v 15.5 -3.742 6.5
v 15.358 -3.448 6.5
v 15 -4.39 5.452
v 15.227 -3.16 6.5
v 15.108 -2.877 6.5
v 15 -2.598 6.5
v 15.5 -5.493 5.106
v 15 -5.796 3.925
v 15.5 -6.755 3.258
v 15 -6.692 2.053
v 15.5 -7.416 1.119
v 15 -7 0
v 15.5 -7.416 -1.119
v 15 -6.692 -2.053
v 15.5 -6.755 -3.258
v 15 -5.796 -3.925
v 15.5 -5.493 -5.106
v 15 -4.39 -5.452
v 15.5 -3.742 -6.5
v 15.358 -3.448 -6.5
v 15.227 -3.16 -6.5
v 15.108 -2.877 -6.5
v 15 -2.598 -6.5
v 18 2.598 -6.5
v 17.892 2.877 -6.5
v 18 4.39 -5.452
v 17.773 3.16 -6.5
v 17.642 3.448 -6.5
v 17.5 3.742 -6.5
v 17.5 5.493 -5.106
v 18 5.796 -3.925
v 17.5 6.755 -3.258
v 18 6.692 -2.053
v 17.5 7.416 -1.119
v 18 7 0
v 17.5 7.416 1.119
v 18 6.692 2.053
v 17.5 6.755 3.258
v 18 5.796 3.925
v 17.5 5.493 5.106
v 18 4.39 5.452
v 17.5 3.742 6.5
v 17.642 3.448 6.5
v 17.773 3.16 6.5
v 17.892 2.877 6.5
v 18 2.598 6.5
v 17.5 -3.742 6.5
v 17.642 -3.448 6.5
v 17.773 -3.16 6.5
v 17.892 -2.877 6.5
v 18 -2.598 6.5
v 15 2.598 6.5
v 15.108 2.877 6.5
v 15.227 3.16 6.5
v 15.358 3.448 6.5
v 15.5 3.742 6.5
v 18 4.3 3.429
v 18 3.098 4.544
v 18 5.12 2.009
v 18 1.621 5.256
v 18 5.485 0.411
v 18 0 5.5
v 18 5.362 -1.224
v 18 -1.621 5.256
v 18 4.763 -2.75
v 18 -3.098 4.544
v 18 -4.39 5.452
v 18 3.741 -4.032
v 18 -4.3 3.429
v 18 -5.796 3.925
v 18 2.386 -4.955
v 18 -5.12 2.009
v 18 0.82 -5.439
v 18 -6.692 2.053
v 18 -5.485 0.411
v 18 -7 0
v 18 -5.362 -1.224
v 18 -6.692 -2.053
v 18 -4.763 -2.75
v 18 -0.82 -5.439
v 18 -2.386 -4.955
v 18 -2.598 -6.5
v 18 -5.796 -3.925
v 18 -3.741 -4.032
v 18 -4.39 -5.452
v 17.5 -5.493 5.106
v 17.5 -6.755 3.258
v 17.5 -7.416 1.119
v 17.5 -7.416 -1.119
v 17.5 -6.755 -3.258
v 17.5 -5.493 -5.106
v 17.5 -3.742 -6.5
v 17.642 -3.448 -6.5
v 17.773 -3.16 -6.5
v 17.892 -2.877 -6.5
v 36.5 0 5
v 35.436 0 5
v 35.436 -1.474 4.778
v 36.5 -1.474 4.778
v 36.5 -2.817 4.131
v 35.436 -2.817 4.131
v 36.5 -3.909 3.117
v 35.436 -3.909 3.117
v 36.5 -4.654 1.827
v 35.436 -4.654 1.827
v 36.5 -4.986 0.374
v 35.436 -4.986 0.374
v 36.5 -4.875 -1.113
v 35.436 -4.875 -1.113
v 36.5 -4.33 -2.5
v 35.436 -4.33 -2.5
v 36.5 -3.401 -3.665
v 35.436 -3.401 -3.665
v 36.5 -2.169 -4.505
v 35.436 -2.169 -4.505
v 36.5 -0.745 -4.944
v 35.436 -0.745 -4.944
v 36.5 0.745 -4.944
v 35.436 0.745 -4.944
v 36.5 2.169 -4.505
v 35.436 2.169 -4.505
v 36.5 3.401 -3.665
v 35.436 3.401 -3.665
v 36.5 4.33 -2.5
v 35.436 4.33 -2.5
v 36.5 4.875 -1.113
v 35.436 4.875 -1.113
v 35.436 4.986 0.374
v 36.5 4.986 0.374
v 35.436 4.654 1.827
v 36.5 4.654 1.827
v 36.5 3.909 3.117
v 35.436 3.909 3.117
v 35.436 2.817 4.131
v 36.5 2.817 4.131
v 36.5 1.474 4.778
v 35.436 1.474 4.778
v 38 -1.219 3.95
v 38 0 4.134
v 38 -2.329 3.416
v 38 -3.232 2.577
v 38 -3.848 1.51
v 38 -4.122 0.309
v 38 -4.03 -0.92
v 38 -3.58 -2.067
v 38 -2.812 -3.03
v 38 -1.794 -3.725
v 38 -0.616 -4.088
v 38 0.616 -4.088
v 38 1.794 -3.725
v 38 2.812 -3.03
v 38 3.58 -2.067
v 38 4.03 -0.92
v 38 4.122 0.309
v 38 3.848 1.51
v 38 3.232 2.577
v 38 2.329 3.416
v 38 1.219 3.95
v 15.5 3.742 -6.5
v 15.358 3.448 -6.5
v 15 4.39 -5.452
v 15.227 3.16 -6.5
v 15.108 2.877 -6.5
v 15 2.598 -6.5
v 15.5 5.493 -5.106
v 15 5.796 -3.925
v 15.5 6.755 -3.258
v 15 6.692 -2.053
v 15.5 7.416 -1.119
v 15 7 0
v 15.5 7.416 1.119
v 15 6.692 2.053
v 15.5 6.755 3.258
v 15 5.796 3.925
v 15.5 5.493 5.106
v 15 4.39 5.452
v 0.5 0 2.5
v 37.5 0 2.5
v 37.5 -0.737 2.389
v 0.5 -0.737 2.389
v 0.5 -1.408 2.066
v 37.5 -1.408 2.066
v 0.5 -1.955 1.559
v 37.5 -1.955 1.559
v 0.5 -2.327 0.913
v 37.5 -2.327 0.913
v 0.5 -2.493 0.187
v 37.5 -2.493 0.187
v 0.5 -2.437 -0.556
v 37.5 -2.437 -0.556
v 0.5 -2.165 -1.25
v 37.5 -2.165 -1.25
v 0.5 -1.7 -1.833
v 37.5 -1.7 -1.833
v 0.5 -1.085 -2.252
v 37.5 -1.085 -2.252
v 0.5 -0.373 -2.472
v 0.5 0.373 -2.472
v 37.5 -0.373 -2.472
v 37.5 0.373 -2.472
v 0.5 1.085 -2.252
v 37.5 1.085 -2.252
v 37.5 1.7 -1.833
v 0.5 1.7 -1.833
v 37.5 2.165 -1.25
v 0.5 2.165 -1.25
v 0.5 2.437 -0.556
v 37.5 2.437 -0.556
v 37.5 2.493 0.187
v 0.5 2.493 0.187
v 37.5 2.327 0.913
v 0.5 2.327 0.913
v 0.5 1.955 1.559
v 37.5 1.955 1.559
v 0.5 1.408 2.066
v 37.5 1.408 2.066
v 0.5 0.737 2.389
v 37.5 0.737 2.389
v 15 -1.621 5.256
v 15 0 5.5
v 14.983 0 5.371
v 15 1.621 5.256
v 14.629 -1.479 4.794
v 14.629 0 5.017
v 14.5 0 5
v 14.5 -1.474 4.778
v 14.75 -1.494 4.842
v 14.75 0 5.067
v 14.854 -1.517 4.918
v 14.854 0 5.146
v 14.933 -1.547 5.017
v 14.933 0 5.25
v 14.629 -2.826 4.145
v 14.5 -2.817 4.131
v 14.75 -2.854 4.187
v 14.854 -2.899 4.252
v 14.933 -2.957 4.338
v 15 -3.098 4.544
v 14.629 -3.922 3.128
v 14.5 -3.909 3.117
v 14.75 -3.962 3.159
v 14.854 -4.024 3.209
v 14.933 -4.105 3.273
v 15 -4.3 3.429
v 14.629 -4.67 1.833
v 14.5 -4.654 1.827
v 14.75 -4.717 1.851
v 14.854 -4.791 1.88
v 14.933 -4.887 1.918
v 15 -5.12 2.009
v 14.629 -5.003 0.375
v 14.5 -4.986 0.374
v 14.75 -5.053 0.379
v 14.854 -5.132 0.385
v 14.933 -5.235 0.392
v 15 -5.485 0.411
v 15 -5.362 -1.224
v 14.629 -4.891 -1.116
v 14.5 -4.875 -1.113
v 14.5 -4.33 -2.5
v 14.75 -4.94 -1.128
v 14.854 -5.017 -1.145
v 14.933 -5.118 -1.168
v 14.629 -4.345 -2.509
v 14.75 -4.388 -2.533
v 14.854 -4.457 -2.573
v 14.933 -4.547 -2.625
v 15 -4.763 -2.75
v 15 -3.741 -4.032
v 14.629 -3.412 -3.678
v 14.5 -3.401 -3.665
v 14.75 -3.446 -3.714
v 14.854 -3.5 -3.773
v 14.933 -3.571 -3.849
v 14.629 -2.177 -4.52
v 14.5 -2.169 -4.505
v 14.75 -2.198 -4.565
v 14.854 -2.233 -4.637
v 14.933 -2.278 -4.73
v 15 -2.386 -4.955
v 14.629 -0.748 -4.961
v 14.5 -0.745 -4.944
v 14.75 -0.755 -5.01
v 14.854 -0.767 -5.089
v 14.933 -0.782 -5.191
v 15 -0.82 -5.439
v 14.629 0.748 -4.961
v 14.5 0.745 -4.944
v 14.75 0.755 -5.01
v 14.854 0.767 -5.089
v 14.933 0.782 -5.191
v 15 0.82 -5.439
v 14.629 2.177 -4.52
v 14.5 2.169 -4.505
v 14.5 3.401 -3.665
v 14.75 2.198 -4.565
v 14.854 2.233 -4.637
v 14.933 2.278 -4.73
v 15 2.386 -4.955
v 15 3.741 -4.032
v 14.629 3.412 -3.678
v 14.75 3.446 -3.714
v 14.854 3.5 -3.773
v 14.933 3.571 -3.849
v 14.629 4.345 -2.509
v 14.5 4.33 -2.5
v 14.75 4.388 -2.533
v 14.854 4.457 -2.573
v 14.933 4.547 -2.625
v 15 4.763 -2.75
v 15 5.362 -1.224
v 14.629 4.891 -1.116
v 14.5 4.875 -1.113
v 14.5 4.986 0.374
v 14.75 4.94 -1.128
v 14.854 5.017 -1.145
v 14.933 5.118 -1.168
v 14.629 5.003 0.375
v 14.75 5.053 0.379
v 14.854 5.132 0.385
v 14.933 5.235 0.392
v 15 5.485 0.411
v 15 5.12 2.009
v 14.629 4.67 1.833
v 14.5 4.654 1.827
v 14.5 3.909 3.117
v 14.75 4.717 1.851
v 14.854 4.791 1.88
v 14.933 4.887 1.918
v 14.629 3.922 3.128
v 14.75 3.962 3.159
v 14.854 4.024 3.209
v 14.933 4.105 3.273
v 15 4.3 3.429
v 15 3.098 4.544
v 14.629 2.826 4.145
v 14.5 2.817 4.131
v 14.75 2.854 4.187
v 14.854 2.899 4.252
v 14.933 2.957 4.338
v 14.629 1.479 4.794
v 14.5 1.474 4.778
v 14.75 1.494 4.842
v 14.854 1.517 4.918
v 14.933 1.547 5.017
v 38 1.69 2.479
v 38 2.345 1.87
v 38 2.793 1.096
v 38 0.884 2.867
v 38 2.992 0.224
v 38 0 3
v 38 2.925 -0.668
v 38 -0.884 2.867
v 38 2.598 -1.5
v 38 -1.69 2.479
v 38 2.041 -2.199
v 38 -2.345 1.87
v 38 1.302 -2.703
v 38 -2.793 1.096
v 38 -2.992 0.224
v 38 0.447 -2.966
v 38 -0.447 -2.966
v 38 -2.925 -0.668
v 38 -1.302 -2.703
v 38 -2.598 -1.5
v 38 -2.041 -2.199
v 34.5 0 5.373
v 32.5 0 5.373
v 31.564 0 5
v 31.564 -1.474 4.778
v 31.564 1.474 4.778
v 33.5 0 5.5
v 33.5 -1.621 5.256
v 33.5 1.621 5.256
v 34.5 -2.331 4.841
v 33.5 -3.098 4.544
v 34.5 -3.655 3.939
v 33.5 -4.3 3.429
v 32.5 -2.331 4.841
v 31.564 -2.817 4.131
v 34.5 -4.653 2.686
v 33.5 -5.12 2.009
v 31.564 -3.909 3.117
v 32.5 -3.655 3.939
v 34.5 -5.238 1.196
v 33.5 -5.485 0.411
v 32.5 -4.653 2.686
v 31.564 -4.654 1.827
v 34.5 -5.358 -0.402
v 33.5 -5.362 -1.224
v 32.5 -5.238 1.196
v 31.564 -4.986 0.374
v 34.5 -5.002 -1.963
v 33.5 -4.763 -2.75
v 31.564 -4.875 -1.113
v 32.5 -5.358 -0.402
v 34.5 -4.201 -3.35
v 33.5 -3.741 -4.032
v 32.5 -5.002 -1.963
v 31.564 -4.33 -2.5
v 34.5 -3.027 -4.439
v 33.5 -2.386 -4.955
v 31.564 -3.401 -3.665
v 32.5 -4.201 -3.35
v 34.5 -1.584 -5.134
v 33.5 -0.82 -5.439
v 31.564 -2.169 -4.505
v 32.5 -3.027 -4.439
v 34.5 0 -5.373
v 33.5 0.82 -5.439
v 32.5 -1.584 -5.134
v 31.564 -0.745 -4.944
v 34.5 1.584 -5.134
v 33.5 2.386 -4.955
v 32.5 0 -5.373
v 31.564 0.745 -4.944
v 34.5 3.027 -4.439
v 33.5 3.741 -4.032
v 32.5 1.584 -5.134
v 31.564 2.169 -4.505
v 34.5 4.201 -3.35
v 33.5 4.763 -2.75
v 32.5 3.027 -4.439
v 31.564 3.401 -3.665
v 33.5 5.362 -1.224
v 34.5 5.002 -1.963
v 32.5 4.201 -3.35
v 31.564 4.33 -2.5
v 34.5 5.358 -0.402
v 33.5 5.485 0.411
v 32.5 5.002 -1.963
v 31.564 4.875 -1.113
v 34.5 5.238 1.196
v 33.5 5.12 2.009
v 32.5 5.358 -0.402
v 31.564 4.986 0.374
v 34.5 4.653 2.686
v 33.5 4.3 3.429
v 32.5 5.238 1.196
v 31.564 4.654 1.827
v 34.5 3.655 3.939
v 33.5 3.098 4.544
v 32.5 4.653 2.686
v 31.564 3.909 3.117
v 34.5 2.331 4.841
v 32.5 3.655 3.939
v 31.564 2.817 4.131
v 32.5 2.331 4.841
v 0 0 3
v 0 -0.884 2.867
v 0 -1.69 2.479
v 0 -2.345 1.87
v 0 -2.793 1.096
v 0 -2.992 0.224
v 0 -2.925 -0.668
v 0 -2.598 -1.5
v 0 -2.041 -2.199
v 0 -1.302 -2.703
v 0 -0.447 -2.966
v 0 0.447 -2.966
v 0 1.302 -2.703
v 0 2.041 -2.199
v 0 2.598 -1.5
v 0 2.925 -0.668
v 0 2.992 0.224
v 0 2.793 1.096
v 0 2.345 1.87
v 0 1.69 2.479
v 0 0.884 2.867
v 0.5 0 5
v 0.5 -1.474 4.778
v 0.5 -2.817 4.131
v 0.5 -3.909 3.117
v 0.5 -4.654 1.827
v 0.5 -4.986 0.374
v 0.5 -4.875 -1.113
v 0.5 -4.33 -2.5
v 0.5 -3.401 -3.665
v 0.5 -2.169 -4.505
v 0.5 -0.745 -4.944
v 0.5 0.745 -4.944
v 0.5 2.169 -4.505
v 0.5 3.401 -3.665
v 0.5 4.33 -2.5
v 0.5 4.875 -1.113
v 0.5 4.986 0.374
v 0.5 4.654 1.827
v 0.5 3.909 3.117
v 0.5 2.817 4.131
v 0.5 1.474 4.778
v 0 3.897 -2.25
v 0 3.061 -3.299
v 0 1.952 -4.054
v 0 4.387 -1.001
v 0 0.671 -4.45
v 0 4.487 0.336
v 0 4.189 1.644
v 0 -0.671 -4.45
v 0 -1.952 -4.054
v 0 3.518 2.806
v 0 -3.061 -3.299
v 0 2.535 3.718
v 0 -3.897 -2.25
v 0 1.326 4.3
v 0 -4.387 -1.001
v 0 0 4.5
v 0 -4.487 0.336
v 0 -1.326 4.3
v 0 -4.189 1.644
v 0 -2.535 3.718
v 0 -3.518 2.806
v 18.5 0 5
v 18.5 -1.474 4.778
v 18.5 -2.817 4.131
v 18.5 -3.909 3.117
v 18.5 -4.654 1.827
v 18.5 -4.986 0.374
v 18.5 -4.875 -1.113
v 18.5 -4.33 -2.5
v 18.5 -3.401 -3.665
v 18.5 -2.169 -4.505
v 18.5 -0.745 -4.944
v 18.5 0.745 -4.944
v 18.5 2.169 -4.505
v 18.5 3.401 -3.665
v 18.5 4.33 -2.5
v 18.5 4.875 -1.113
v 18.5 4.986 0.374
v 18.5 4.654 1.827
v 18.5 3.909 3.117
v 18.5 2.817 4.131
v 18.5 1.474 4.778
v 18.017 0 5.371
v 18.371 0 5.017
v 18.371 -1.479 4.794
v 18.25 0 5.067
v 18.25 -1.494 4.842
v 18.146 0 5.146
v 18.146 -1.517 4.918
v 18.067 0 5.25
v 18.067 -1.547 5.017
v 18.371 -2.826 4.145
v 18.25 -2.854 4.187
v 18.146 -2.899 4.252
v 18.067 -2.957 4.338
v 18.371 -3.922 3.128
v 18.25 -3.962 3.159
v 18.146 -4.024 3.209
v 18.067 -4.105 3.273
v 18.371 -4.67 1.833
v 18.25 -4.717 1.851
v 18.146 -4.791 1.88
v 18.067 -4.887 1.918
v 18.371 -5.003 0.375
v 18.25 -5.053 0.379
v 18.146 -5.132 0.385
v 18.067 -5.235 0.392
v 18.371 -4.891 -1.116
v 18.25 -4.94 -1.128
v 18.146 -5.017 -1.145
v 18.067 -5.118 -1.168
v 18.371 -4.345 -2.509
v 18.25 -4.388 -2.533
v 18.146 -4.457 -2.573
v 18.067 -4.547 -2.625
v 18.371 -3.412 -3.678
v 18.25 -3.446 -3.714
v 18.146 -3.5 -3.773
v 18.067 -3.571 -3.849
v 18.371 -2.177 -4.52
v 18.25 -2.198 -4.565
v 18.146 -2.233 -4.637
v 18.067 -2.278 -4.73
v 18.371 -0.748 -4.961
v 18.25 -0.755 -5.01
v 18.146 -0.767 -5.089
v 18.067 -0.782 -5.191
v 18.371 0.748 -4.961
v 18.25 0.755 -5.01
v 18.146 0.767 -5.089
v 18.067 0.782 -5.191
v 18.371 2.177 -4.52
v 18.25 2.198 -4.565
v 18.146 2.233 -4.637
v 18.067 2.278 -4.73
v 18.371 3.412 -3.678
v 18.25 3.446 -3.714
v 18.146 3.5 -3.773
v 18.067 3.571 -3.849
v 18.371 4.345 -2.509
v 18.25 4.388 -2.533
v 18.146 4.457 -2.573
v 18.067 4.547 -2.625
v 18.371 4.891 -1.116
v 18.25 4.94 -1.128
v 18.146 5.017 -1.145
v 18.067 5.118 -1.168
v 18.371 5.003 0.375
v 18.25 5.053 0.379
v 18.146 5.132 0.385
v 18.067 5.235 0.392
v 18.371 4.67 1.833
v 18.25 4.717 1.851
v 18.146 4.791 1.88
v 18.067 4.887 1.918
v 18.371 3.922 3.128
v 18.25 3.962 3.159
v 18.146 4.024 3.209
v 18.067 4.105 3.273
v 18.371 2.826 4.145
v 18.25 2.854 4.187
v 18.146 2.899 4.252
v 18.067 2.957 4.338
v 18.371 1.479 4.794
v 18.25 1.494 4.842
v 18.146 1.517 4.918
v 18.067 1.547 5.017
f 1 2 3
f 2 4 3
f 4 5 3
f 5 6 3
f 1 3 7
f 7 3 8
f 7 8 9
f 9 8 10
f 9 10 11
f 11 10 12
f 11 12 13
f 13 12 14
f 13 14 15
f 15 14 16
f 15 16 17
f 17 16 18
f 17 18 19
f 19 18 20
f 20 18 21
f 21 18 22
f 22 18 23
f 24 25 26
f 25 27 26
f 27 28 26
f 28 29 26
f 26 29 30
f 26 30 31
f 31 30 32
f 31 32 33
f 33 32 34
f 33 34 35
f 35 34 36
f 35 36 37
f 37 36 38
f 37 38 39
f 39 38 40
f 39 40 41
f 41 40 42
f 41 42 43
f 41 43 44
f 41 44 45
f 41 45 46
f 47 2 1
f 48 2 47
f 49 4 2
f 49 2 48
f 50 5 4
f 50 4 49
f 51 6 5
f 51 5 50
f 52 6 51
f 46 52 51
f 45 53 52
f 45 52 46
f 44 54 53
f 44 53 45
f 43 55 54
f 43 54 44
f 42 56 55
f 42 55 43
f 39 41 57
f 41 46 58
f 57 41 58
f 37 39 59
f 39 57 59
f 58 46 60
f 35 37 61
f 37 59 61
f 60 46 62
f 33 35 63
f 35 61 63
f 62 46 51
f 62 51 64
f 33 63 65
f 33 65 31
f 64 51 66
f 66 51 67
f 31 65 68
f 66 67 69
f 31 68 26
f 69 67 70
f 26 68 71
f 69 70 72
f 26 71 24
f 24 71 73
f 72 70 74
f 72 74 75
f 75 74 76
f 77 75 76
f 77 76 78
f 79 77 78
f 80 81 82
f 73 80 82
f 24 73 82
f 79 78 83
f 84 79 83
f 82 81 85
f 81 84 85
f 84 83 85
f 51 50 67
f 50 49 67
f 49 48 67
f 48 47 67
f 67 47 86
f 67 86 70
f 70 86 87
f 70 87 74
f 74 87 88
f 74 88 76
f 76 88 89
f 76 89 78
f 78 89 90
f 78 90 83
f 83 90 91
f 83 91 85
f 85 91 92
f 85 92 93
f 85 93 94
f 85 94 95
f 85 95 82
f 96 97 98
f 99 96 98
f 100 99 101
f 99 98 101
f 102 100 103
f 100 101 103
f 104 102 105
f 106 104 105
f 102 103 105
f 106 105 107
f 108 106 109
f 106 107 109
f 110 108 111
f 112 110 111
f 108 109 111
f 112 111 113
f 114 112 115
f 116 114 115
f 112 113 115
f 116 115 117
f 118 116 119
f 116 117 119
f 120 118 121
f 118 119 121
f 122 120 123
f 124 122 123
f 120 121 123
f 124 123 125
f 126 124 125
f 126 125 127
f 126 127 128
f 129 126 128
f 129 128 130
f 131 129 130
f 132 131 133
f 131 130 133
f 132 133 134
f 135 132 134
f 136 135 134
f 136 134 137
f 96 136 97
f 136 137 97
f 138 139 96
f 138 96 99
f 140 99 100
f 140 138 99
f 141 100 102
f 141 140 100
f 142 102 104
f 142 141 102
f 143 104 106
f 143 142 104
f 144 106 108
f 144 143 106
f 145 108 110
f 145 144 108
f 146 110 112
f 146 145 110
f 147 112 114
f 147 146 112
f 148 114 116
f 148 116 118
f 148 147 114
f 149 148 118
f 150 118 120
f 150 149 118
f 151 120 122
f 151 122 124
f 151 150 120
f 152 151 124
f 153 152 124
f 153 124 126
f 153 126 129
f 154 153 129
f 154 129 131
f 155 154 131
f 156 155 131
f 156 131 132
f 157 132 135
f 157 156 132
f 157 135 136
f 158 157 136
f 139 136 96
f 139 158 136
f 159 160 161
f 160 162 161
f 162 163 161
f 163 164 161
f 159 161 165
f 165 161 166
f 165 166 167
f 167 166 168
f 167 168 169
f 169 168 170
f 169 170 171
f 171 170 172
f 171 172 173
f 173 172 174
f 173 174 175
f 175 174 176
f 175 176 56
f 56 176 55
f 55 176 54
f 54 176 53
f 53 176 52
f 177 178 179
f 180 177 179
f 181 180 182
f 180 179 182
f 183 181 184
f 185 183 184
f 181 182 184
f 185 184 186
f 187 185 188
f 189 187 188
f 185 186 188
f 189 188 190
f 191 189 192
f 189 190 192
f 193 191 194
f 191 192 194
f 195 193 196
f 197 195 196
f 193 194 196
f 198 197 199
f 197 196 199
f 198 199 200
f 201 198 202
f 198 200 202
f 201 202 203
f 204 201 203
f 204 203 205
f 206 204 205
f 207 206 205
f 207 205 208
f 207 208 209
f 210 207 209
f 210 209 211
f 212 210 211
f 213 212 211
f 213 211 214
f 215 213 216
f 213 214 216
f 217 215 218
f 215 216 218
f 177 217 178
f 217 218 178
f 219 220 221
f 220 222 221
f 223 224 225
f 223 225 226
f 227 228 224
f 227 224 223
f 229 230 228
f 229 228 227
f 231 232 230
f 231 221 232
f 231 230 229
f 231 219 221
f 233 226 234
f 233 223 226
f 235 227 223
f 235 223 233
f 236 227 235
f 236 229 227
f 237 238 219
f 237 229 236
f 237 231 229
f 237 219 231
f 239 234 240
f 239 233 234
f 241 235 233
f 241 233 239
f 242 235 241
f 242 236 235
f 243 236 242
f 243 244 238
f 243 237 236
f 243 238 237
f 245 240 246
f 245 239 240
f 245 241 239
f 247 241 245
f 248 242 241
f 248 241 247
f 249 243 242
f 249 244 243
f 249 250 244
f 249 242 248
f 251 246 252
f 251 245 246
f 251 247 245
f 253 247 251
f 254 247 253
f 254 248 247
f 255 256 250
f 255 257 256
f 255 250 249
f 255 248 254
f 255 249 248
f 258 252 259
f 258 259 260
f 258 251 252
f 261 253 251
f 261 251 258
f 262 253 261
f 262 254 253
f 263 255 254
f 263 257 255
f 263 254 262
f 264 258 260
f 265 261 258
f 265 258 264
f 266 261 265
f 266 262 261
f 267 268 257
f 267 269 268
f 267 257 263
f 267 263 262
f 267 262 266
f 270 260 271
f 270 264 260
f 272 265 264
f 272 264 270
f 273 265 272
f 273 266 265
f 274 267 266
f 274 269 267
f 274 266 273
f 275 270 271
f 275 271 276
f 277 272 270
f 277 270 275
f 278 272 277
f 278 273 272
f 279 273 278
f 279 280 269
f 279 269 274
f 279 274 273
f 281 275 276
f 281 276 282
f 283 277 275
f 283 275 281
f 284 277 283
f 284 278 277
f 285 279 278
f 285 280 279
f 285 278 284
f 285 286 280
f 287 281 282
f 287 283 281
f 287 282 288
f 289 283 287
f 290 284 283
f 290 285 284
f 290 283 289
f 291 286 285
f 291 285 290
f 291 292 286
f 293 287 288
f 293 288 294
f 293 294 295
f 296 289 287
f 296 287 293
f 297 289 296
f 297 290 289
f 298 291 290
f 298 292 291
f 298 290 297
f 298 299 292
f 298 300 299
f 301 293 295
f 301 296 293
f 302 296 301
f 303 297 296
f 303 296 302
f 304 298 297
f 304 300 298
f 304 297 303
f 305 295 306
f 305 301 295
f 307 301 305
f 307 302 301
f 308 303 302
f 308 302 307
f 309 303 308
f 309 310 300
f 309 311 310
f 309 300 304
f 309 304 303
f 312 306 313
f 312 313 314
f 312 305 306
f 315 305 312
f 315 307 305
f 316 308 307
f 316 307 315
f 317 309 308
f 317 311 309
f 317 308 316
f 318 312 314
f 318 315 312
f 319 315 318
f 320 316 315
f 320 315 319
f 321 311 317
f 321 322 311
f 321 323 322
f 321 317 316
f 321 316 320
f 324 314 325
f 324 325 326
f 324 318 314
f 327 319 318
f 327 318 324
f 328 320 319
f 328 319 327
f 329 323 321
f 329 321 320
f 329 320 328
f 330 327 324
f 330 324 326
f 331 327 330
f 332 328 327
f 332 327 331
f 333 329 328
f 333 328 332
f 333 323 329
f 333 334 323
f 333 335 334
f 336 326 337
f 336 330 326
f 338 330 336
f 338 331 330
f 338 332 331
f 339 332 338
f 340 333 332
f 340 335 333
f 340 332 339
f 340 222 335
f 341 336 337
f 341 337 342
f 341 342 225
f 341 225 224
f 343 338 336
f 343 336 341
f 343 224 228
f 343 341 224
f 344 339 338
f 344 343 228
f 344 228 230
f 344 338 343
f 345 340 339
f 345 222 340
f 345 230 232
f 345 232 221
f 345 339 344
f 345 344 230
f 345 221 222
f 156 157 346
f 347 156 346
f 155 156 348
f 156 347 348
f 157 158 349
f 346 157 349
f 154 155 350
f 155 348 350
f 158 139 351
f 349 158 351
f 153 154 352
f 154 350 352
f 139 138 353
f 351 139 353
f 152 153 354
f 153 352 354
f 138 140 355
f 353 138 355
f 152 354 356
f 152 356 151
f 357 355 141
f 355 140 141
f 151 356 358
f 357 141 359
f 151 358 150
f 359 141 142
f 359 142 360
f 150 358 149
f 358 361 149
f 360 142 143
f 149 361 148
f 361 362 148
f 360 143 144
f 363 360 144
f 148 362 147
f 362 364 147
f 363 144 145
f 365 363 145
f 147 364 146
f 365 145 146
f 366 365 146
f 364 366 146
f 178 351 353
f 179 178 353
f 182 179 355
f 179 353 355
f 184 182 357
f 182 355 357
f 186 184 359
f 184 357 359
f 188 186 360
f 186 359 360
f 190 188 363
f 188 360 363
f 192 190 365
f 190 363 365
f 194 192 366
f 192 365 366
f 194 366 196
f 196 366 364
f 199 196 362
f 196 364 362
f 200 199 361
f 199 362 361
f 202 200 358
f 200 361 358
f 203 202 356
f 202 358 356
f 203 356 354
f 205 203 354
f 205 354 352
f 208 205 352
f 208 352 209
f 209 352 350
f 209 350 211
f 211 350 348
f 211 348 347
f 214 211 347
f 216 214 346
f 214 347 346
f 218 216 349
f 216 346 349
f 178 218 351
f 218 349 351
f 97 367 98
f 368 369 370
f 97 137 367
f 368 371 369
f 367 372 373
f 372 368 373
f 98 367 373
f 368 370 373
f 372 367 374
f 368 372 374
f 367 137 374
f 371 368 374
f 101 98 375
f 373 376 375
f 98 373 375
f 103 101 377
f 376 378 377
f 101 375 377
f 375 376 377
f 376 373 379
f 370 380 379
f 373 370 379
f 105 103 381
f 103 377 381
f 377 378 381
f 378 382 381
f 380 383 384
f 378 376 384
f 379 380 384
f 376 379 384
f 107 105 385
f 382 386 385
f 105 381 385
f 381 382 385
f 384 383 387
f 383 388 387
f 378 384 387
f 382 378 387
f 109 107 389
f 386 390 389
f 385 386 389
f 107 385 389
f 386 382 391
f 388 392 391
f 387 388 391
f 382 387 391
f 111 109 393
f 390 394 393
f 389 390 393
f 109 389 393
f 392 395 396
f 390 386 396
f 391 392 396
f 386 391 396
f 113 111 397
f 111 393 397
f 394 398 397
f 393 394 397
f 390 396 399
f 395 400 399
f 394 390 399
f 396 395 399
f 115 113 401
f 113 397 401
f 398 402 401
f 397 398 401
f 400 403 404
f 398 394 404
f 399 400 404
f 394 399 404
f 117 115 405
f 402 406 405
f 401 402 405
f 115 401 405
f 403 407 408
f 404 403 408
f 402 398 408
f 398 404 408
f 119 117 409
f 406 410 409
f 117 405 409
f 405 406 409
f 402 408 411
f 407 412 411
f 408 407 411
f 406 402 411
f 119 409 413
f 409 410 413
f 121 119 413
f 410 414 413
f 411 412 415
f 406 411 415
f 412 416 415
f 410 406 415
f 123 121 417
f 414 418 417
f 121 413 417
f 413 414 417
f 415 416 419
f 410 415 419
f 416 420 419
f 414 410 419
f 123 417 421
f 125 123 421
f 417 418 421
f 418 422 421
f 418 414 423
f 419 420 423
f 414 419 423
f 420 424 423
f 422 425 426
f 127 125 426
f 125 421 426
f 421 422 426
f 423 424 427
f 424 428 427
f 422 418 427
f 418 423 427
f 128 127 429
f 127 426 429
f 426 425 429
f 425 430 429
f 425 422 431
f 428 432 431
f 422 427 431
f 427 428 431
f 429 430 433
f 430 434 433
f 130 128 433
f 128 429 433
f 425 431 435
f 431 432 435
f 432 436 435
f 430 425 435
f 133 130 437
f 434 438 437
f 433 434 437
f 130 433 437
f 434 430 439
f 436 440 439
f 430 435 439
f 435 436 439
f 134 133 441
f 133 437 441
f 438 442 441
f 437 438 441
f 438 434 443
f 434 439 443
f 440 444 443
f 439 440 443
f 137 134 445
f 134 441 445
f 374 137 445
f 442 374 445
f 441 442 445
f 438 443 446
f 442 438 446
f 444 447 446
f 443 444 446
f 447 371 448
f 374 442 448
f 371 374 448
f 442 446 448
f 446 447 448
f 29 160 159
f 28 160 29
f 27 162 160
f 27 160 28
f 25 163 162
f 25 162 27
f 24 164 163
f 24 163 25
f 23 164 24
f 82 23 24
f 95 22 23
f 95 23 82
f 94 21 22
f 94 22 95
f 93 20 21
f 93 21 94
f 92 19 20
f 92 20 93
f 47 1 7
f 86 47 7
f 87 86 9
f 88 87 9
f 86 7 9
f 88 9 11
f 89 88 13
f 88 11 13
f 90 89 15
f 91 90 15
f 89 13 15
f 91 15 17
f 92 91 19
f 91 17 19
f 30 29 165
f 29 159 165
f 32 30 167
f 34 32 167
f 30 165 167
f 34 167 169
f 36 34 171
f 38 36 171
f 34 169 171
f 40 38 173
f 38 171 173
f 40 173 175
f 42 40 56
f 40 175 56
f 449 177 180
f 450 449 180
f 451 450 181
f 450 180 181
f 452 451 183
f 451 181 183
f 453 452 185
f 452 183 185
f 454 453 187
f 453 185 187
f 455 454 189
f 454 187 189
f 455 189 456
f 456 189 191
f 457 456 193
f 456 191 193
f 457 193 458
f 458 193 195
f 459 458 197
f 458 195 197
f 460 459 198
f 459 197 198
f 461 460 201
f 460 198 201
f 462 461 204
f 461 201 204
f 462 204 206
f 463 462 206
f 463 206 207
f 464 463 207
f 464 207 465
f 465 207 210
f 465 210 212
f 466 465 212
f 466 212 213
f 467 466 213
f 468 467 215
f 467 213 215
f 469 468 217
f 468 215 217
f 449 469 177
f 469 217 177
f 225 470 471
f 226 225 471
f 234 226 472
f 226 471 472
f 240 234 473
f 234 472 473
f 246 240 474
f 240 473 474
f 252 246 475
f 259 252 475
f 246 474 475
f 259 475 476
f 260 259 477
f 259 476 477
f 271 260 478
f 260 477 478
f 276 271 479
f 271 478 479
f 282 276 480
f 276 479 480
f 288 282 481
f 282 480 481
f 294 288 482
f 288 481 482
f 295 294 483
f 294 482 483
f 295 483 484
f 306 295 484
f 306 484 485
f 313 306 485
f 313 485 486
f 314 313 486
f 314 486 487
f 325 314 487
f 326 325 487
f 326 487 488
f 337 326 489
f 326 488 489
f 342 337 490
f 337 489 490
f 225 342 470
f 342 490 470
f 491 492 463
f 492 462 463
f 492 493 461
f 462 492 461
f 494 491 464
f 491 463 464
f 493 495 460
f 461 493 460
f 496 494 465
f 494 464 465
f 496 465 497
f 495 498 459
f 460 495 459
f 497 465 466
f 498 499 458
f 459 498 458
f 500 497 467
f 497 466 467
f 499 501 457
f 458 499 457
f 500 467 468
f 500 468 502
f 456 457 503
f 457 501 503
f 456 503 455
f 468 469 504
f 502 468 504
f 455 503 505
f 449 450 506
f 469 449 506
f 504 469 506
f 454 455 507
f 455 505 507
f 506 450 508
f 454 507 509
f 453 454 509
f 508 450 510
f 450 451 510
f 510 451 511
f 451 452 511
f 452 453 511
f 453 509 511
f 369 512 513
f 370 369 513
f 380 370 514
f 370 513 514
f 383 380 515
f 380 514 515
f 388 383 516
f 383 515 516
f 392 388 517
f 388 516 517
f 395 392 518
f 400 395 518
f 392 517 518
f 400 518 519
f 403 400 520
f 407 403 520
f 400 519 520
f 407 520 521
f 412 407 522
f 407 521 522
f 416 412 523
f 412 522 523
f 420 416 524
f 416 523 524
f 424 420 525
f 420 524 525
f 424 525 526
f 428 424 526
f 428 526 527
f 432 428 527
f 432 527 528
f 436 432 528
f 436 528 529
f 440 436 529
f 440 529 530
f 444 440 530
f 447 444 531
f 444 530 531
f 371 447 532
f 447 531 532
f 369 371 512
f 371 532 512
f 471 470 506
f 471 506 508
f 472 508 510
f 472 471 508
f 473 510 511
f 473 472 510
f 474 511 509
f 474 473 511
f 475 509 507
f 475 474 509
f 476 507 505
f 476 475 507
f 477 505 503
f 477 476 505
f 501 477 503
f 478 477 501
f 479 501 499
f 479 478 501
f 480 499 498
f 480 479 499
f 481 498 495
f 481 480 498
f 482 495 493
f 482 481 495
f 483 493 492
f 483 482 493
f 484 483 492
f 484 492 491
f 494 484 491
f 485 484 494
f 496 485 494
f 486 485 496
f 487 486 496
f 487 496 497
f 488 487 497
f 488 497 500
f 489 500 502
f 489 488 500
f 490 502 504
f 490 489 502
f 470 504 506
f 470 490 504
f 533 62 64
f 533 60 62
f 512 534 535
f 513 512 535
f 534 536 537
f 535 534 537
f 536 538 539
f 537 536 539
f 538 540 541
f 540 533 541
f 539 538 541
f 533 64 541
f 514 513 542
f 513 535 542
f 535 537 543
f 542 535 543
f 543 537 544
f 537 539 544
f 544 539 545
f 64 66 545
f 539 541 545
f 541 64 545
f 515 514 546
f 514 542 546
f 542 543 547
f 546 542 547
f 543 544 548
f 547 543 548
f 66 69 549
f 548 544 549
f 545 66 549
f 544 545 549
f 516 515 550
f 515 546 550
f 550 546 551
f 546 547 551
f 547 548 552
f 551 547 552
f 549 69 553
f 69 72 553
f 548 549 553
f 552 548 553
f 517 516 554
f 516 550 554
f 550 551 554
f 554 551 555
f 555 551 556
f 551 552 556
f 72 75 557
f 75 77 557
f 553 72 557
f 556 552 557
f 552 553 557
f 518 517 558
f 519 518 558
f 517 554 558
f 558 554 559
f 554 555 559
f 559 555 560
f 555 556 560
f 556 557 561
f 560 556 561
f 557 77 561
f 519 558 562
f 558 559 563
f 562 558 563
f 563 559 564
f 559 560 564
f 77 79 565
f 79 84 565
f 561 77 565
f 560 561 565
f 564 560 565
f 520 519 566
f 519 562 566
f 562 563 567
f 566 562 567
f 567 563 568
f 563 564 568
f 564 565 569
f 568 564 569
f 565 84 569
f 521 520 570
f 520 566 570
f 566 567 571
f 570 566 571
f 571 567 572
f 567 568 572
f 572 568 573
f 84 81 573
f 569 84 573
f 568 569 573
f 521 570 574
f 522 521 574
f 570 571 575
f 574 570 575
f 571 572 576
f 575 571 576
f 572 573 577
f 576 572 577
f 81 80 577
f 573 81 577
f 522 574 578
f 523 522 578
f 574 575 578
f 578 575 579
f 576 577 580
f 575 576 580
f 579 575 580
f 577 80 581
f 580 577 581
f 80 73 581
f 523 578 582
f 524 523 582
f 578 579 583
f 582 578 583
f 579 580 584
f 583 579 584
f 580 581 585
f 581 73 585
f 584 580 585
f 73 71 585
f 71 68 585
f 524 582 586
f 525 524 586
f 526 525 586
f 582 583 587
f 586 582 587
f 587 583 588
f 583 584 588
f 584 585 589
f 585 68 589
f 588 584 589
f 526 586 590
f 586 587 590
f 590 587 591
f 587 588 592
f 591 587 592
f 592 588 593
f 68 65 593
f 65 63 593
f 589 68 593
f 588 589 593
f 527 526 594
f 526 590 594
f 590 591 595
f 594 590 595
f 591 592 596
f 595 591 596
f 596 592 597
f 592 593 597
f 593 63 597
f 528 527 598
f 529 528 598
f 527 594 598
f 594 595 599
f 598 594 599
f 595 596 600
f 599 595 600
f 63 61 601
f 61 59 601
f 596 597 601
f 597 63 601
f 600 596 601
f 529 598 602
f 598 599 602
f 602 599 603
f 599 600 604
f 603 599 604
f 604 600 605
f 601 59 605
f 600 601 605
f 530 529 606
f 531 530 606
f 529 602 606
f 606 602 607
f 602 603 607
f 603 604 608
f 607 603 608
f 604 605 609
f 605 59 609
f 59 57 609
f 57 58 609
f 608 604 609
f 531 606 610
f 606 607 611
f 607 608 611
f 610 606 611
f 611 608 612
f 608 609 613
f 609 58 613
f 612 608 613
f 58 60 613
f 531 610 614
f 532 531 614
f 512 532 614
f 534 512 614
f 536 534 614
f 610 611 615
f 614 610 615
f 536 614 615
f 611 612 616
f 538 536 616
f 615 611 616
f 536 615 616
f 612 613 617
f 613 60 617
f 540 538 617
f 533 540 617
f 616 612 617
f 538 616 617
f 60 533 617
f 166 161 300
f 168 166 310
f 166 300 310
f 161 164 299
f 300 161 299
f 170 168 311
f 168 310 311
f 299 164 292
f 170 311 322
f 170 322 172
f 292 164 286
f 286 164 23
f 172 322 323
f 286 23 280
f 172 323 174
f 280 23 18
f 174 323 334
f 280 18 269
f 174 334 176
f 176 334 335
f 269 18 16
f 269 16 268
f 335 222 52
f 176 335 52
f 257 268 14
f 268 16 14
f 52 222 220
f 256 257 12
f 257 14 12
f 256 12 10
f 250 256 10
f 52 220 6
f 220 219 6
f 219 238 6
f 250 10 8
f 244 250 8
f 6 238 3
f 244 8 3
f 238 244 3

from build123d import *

# Parameters (mm, degrees)
F2_SIZE  = 0.5
F3_SIZE2 = 0.8660254038
F3_SIZE  = 1.5
F4_R     = 0.5
F5_W     = 5
F5_H     = 2.7889910041
F5_H_2   = 4.1100917986
F6_DEPTH = 12.5


with BuildPart() as f1:
    # F0 (on Front) → F1 (revolve)
    with BuildSketch(Plane.XZ):
        with BuildLine():
            Line((0, 5), (0, 2.5))
            Line((0, 2.5), (38, 2.5))
            Line((38, 2.5), (38, 5))
            Line((38, 5), (35.4364916731, 5))
            ThreePointArc((35.4364916731, 5), (33.5, 5.5), (31.5635083269, 5))
            Line((31.5635083269, 5), (18, 5))
            Line((18, 5), (18, 7.5))
            Line((18, 7.5), (15, 7.5))
            Line((15, 7.5), (15, 5))
            Line((15, 5), (0, 5))
        make_face()
    revolve(axis=Axis((21.8194629997, 0, 0), (1, 0, 0)))

    # F2
    f2_edges = [f1.edges().sort_by_distance(p)[0] for p in [
        (0, 0, -5),
        (18, 0, -7.5),
        (15, 0, -7.5),
        (0, 0, -2.5),
        (38, 0, -2.5),
    ]]
    chamfer(f2_edges, length=F2_SIZE)

    # F3
    f3_edges = [f1.edges().sort_by_distance(p)[0] for p in [
        (38, 0, -5),
    ]]
    f3_side = f1.faces().sort_by_distance((36.718246, 0, -5))[0]
    chamfer(f3_edges, length=F3_SIZE, length2=F3_SIZE2, reference=f3_side)

    # F4
    f4_edges = [f1.edges().sort_by_distance(p)[0] for p in [
        (18, 0, -5),
        (15, 0, -5),
    ]]
    fillet(f4_edges, radius=F4_R)

    # F5 (on Front) → F6 (cut, symmetric)
    with BuildSketch(Plane.XZ):
        with Locations((16.6406241506, 7.894495502)):
            Rectangle(F5_W, F5_H)
        with Locations((16.6406241506, -8.5550458993)):
            Rectangle(F5_W, F5_H_2)
    extrude(amount=F6_DEPTH, both=True, mode=Mode.SUBTRACT)


solid = f1.part
